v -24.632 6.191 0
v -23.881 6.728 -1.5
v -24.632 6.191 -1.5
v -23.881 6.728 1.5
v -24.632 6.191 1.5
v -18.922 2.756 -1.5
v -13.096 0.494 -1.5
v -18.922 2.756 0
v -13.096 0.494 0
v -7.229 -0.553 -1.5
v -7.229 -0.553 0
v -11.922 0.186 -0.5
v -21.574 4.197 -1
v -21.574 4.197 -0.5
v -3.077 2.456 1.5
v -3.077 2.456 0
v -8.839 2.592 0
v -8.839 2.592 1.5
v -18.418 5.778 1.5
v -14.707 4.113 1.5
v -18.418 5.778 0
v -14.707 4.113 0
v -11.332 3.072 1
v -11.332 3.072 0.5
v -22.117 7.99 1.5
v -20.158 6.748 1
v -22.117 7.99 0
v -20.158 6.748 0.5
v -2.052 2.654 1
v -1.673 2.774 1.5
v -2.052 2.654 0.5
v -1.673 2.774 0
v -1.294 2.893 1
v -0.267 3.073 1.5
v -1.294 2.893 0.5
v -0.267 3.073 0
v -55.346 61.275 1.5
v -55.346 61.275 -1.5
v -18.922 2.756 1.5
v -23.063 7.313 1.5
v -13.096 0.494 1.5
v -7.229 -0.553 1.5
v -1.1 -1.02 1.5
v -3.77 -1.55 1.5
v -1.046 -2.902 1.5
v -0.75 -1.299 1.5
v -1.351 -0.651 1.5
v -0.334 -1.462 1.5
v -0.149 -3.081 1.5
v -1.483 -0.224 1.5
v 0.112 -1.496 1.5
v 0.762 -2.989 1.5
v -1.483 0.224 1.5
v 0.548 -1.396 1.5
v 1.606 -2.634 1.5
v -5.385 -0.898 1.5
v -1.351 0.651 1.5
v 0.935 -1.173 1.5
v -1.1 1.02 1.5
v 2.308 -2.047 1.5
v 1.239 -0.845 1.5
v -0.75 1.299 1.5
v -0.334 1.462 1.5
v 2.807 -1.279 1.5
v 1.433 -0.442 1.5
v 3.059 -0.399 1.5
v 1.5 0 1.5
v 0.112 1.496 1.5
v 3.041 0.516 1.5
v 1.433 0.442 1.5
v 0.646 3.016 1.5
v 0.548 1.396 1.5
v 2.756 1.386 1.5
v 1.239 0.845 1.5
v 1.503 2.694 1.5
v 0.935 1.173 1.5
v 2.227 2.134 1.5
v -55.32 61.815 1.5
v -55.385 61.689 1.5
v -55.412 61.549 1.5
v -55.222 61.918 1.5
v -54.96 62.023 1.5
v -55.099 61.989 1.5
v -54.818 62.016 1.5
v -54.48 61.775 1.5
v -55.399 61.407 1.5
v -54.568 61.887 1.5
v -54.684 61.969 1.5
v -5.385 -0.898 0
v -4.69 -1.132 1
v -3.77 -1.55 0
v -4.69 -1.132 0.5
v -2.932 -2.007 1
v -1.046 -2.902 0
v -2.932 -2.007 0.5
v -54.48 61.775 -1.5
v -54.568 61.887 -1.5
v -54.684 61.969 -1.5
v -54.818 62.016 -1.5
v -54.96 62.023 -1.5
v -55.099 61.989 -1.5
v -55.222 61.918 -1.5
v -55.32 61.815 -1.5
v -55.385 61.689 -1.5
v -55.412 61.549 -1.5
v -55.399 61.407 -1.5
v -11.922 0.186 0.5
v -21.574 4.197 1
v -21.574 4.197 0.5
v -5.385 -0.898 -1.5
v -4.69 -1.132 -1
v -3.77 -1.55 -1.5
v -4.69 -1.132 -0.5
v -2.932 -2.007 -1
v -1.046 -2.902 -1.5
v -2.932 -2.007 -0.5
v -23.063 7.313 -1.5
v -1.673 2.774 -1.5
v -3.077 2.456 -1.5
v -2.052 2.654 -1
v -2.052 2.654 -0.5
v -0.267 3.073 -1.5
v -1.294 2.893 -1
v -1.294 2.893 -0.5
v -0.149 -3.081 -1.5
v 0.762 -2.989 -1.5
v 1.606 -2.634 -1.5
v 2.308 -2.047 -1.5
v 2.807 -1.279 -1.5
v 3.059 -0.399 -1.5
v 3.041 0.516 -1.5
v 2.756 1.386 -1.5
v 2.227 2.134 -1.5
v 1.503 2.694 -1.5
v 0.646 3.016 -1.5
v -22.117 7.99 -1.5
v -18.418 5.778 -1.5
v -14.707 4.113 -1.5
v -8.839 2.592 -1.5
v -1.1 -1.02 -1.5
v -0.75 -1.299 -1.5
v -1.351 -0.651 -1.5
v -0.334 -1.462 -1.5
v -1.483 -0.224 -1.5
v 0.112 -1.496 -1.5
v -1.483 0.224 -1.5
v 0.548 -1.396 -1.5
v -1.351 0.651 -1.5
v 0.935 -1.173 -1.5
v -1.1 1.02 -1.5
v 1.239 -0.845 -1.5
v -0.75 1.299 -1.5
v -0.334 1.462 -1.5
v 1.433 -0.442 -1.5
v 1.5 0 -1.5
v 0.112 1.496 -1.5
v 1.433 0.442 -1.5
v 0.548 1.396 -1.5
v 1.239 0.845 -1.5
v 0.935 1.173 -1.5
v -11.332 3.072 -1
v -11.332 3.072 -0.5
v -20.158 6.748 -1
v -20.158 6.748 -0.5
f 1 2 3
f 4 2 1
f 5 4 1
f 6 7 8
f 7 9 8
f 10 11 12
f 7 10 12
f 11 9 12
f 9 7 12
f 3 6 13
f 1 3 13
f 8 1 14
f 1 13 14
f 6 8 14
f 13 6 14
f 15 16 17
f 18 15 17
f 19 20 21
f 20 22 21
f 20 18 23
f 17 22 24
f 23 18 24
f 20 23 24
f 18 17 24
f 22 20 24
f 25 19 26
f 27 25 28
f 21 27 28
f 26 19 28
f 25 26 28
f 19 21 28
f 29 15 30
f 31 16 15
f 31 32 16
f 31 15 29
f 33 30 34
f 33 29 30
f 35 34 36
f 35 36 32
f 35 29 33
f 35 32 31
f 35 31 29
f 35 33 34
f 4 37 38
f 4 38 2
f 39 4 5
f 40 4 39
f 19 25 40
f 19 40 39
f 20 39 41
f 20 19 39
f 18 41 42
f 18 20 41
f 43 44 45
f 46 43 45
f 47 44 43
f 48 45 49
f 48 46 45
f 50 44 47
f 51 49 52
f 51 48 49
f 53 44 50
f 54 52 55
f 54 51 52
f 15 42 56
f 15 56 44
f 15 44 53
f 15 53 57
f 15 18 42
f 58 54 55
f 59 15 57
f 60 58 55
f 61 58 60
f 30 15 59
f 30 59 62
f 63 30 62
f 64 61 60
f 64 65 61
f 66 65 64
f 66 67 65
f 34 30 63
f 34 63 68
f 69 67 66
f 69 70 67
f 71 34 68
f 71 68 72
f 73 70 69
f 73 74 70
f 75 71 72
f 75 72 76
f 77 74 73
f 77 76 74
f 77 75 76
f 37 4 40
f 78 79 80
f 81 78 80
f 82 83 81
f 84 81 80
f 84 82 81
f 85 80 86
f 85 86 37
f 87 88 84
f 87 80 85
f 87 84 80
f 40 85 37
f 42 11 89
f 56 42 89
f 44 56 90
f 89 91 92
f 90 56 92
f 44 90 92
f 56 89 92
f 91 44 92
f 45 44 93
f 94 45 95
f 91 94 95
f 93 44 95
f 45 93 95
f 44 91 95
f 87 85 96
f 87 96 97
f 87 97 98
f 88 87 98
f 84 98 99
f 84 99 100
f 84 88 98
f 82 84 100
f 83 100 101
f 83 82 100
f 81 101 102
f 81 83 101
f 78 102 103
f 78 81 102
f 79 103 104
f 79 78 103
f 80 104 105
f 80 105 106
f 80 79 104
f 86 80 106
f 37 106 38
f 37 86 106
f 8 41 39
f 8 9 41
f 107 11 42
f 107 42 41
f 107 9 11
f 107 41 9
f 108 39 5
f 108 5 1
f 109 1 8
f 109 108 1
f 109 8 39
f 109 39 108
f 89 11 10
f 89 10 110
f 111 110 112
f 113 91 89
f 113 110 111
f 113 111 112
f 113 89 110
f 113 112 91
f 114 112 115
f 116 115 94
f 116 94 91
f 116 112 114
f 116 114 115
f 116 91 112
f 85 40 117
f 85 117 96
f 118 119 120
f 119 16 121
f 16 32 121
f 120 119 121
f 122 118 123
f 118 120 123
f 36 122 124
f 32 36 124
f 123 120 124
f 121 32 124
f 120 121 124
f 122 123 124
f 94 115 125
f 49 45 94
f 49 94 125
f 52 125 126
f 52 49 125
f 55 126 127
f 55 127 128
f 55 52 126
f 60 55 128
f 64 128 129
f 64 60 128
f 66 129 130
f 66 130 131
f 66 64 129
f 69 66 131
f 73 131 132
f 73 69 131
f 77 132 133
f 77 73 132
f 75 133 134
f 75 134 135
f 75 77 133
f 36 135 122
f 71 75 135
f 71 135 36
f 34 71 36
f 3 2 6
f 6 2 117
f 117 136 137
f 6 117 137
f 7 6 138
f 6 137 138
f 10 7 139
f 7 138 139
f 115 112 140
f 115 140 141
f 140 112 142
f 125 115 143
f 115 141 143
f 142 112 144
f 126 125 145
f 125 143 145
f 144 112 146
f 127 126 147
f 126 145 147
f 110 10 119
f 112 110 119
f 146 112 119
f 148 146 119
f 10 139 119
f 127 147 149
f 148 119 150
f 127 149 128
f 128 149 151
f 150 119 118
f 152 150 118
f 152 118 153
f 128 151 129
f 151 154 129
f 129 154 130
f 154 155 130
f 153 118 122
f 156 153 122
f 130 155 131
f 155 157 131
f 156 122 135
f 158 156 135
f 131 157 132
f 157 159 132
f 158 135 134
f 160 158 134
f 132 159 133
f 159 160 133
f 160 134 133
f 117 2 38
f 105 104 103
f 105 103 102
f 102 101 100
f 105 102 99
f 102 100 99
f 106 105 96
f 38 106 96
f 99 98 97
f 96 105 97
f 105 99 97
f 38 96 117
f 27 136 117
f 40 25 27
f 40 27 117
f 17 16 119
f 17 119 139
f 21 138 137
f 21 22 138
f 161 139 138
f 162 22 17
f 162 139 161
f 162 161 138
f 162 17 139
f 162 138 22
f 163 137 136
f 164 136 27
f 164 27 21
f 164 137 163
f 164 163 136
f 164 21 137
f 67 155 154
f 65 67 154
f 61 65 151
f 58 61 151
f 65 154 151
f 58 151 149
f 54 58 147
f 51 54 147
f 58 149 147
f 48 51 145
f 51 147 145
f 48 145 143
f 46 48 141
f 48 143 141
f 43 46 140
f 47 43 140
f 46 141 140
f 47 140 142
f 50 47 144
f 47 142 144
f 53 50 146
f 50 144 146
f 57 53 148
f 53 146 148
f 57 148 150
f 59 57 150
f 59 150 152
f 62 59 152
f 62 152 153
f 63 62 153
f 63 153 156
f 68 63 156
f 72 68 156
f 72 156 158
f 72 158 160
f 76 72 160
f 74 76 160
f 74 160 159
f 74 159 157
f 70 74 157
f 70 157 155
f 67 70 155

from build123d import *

# Parameters (mm, degrees)
F1_DEPTH = 1.5
F2_R     = 1.5
F3_DEPTH = 25


# Not quite as in the source:
# - the dataset's text gives a spline's control points without its knots; the knots are read off the source's solid


with BuildPart() as f1:
    # F0 (on Top) → F1 (new body, symmetric)
    with BuildSketch(Plane.XY):
        with BuildLine():
            add(Edge.make_bspline(
                [(-7.2290541015, -0.5527675977), (-3.9967772573, -0.8917449116), (-3.2988634653, -2.0894490401), (-1.0464995032, -2.9017509308)],
                knots=[0, 0, 0, 0, 6.6137511338, 6.6137511338, 6.6137511338, 6.6137511338], degree=3))
            ThreePointArc((-1.0464995032, -2.9017509308), (3.0587935975, -0.3988751709), (-0.2673646533, 3.0730824617))
            add(Edge.make_bspline(
                [(-3.0769753559, 2.4563793473), (-1.7409748989, 2.5984151431), (-1.6058379576, 2.9566324623), (-0.2673646533, 3.0730824617)],
                knots=[0, 0, 0, 0, 2.876497007, 2.876497007, 2.876497007, 2.876497007], degree=3))
            add(Edge.make_bspline(
                [(-3.0769753559, 2.4563793473), (-5.7816746579, 2.1906947352), (-11.4426782467, 2.6135423344), (-17.8801982674, 5.2791288997), (-21.4653904829, 7.5502048837), (-22.1168282691, 7.9895307861)],
                knots=[0.005973262, 0.005973262, 0.005973262, 0.005973262, 0.125, 0.25, 0.277850749, 0.277850749, 0.277850749, 0.277850749], degree=3))
            Line((-22.1168282691, 7.9895307861), (-23.0633222923, 7.3125738031))
            Line((-23.0633222923, 7.3125738031), (-54.4799332581, 61.7749325905))
            ThreePointArc((-54.4799332581, 61.7749325905), (-55.1628772285, 61.9582016093), (-55.3461462473, 61.2752576388))
            Line((-55.3461462473, 61.2752576388), (-23.8805872256, 6.7280448046))
            Line((-23.8805872256, 6.7280448046), (-24.6317860127, 6.1907680209))
            add(Edge.make_bspline(
                [(-7.2290541015, -0.5527675977), (-8.7909293011, -0.4393198693), (-13.6136774425, 0.3217510425), (-19.4562298082, 2.7561257866), (-23.6206363974, 5.4709704249), (-24.6317860127, 6.1907680209)],
                knots=[0.064829406, 0.064829406, 0.064829406, 0.064829406, 0.125, 0.25, 0.290542228, 0.290542228, 0.290542228, 0.290542228], degree=3))
        make_face()
    extrude(amount=F1_DEPTH, both=True)

    # F2 (on face) → F3 (cut)
    with BuildSketch(Plane(origin=(0, 0, -1.5), x_dir=(1, 0, 0), z_dir=(0, 0, -1))):
        Circle(F2_R)
    extrude(amount=-F3_DEPTH, mode=Mode.SUBTRACT)


solid = f1.part
